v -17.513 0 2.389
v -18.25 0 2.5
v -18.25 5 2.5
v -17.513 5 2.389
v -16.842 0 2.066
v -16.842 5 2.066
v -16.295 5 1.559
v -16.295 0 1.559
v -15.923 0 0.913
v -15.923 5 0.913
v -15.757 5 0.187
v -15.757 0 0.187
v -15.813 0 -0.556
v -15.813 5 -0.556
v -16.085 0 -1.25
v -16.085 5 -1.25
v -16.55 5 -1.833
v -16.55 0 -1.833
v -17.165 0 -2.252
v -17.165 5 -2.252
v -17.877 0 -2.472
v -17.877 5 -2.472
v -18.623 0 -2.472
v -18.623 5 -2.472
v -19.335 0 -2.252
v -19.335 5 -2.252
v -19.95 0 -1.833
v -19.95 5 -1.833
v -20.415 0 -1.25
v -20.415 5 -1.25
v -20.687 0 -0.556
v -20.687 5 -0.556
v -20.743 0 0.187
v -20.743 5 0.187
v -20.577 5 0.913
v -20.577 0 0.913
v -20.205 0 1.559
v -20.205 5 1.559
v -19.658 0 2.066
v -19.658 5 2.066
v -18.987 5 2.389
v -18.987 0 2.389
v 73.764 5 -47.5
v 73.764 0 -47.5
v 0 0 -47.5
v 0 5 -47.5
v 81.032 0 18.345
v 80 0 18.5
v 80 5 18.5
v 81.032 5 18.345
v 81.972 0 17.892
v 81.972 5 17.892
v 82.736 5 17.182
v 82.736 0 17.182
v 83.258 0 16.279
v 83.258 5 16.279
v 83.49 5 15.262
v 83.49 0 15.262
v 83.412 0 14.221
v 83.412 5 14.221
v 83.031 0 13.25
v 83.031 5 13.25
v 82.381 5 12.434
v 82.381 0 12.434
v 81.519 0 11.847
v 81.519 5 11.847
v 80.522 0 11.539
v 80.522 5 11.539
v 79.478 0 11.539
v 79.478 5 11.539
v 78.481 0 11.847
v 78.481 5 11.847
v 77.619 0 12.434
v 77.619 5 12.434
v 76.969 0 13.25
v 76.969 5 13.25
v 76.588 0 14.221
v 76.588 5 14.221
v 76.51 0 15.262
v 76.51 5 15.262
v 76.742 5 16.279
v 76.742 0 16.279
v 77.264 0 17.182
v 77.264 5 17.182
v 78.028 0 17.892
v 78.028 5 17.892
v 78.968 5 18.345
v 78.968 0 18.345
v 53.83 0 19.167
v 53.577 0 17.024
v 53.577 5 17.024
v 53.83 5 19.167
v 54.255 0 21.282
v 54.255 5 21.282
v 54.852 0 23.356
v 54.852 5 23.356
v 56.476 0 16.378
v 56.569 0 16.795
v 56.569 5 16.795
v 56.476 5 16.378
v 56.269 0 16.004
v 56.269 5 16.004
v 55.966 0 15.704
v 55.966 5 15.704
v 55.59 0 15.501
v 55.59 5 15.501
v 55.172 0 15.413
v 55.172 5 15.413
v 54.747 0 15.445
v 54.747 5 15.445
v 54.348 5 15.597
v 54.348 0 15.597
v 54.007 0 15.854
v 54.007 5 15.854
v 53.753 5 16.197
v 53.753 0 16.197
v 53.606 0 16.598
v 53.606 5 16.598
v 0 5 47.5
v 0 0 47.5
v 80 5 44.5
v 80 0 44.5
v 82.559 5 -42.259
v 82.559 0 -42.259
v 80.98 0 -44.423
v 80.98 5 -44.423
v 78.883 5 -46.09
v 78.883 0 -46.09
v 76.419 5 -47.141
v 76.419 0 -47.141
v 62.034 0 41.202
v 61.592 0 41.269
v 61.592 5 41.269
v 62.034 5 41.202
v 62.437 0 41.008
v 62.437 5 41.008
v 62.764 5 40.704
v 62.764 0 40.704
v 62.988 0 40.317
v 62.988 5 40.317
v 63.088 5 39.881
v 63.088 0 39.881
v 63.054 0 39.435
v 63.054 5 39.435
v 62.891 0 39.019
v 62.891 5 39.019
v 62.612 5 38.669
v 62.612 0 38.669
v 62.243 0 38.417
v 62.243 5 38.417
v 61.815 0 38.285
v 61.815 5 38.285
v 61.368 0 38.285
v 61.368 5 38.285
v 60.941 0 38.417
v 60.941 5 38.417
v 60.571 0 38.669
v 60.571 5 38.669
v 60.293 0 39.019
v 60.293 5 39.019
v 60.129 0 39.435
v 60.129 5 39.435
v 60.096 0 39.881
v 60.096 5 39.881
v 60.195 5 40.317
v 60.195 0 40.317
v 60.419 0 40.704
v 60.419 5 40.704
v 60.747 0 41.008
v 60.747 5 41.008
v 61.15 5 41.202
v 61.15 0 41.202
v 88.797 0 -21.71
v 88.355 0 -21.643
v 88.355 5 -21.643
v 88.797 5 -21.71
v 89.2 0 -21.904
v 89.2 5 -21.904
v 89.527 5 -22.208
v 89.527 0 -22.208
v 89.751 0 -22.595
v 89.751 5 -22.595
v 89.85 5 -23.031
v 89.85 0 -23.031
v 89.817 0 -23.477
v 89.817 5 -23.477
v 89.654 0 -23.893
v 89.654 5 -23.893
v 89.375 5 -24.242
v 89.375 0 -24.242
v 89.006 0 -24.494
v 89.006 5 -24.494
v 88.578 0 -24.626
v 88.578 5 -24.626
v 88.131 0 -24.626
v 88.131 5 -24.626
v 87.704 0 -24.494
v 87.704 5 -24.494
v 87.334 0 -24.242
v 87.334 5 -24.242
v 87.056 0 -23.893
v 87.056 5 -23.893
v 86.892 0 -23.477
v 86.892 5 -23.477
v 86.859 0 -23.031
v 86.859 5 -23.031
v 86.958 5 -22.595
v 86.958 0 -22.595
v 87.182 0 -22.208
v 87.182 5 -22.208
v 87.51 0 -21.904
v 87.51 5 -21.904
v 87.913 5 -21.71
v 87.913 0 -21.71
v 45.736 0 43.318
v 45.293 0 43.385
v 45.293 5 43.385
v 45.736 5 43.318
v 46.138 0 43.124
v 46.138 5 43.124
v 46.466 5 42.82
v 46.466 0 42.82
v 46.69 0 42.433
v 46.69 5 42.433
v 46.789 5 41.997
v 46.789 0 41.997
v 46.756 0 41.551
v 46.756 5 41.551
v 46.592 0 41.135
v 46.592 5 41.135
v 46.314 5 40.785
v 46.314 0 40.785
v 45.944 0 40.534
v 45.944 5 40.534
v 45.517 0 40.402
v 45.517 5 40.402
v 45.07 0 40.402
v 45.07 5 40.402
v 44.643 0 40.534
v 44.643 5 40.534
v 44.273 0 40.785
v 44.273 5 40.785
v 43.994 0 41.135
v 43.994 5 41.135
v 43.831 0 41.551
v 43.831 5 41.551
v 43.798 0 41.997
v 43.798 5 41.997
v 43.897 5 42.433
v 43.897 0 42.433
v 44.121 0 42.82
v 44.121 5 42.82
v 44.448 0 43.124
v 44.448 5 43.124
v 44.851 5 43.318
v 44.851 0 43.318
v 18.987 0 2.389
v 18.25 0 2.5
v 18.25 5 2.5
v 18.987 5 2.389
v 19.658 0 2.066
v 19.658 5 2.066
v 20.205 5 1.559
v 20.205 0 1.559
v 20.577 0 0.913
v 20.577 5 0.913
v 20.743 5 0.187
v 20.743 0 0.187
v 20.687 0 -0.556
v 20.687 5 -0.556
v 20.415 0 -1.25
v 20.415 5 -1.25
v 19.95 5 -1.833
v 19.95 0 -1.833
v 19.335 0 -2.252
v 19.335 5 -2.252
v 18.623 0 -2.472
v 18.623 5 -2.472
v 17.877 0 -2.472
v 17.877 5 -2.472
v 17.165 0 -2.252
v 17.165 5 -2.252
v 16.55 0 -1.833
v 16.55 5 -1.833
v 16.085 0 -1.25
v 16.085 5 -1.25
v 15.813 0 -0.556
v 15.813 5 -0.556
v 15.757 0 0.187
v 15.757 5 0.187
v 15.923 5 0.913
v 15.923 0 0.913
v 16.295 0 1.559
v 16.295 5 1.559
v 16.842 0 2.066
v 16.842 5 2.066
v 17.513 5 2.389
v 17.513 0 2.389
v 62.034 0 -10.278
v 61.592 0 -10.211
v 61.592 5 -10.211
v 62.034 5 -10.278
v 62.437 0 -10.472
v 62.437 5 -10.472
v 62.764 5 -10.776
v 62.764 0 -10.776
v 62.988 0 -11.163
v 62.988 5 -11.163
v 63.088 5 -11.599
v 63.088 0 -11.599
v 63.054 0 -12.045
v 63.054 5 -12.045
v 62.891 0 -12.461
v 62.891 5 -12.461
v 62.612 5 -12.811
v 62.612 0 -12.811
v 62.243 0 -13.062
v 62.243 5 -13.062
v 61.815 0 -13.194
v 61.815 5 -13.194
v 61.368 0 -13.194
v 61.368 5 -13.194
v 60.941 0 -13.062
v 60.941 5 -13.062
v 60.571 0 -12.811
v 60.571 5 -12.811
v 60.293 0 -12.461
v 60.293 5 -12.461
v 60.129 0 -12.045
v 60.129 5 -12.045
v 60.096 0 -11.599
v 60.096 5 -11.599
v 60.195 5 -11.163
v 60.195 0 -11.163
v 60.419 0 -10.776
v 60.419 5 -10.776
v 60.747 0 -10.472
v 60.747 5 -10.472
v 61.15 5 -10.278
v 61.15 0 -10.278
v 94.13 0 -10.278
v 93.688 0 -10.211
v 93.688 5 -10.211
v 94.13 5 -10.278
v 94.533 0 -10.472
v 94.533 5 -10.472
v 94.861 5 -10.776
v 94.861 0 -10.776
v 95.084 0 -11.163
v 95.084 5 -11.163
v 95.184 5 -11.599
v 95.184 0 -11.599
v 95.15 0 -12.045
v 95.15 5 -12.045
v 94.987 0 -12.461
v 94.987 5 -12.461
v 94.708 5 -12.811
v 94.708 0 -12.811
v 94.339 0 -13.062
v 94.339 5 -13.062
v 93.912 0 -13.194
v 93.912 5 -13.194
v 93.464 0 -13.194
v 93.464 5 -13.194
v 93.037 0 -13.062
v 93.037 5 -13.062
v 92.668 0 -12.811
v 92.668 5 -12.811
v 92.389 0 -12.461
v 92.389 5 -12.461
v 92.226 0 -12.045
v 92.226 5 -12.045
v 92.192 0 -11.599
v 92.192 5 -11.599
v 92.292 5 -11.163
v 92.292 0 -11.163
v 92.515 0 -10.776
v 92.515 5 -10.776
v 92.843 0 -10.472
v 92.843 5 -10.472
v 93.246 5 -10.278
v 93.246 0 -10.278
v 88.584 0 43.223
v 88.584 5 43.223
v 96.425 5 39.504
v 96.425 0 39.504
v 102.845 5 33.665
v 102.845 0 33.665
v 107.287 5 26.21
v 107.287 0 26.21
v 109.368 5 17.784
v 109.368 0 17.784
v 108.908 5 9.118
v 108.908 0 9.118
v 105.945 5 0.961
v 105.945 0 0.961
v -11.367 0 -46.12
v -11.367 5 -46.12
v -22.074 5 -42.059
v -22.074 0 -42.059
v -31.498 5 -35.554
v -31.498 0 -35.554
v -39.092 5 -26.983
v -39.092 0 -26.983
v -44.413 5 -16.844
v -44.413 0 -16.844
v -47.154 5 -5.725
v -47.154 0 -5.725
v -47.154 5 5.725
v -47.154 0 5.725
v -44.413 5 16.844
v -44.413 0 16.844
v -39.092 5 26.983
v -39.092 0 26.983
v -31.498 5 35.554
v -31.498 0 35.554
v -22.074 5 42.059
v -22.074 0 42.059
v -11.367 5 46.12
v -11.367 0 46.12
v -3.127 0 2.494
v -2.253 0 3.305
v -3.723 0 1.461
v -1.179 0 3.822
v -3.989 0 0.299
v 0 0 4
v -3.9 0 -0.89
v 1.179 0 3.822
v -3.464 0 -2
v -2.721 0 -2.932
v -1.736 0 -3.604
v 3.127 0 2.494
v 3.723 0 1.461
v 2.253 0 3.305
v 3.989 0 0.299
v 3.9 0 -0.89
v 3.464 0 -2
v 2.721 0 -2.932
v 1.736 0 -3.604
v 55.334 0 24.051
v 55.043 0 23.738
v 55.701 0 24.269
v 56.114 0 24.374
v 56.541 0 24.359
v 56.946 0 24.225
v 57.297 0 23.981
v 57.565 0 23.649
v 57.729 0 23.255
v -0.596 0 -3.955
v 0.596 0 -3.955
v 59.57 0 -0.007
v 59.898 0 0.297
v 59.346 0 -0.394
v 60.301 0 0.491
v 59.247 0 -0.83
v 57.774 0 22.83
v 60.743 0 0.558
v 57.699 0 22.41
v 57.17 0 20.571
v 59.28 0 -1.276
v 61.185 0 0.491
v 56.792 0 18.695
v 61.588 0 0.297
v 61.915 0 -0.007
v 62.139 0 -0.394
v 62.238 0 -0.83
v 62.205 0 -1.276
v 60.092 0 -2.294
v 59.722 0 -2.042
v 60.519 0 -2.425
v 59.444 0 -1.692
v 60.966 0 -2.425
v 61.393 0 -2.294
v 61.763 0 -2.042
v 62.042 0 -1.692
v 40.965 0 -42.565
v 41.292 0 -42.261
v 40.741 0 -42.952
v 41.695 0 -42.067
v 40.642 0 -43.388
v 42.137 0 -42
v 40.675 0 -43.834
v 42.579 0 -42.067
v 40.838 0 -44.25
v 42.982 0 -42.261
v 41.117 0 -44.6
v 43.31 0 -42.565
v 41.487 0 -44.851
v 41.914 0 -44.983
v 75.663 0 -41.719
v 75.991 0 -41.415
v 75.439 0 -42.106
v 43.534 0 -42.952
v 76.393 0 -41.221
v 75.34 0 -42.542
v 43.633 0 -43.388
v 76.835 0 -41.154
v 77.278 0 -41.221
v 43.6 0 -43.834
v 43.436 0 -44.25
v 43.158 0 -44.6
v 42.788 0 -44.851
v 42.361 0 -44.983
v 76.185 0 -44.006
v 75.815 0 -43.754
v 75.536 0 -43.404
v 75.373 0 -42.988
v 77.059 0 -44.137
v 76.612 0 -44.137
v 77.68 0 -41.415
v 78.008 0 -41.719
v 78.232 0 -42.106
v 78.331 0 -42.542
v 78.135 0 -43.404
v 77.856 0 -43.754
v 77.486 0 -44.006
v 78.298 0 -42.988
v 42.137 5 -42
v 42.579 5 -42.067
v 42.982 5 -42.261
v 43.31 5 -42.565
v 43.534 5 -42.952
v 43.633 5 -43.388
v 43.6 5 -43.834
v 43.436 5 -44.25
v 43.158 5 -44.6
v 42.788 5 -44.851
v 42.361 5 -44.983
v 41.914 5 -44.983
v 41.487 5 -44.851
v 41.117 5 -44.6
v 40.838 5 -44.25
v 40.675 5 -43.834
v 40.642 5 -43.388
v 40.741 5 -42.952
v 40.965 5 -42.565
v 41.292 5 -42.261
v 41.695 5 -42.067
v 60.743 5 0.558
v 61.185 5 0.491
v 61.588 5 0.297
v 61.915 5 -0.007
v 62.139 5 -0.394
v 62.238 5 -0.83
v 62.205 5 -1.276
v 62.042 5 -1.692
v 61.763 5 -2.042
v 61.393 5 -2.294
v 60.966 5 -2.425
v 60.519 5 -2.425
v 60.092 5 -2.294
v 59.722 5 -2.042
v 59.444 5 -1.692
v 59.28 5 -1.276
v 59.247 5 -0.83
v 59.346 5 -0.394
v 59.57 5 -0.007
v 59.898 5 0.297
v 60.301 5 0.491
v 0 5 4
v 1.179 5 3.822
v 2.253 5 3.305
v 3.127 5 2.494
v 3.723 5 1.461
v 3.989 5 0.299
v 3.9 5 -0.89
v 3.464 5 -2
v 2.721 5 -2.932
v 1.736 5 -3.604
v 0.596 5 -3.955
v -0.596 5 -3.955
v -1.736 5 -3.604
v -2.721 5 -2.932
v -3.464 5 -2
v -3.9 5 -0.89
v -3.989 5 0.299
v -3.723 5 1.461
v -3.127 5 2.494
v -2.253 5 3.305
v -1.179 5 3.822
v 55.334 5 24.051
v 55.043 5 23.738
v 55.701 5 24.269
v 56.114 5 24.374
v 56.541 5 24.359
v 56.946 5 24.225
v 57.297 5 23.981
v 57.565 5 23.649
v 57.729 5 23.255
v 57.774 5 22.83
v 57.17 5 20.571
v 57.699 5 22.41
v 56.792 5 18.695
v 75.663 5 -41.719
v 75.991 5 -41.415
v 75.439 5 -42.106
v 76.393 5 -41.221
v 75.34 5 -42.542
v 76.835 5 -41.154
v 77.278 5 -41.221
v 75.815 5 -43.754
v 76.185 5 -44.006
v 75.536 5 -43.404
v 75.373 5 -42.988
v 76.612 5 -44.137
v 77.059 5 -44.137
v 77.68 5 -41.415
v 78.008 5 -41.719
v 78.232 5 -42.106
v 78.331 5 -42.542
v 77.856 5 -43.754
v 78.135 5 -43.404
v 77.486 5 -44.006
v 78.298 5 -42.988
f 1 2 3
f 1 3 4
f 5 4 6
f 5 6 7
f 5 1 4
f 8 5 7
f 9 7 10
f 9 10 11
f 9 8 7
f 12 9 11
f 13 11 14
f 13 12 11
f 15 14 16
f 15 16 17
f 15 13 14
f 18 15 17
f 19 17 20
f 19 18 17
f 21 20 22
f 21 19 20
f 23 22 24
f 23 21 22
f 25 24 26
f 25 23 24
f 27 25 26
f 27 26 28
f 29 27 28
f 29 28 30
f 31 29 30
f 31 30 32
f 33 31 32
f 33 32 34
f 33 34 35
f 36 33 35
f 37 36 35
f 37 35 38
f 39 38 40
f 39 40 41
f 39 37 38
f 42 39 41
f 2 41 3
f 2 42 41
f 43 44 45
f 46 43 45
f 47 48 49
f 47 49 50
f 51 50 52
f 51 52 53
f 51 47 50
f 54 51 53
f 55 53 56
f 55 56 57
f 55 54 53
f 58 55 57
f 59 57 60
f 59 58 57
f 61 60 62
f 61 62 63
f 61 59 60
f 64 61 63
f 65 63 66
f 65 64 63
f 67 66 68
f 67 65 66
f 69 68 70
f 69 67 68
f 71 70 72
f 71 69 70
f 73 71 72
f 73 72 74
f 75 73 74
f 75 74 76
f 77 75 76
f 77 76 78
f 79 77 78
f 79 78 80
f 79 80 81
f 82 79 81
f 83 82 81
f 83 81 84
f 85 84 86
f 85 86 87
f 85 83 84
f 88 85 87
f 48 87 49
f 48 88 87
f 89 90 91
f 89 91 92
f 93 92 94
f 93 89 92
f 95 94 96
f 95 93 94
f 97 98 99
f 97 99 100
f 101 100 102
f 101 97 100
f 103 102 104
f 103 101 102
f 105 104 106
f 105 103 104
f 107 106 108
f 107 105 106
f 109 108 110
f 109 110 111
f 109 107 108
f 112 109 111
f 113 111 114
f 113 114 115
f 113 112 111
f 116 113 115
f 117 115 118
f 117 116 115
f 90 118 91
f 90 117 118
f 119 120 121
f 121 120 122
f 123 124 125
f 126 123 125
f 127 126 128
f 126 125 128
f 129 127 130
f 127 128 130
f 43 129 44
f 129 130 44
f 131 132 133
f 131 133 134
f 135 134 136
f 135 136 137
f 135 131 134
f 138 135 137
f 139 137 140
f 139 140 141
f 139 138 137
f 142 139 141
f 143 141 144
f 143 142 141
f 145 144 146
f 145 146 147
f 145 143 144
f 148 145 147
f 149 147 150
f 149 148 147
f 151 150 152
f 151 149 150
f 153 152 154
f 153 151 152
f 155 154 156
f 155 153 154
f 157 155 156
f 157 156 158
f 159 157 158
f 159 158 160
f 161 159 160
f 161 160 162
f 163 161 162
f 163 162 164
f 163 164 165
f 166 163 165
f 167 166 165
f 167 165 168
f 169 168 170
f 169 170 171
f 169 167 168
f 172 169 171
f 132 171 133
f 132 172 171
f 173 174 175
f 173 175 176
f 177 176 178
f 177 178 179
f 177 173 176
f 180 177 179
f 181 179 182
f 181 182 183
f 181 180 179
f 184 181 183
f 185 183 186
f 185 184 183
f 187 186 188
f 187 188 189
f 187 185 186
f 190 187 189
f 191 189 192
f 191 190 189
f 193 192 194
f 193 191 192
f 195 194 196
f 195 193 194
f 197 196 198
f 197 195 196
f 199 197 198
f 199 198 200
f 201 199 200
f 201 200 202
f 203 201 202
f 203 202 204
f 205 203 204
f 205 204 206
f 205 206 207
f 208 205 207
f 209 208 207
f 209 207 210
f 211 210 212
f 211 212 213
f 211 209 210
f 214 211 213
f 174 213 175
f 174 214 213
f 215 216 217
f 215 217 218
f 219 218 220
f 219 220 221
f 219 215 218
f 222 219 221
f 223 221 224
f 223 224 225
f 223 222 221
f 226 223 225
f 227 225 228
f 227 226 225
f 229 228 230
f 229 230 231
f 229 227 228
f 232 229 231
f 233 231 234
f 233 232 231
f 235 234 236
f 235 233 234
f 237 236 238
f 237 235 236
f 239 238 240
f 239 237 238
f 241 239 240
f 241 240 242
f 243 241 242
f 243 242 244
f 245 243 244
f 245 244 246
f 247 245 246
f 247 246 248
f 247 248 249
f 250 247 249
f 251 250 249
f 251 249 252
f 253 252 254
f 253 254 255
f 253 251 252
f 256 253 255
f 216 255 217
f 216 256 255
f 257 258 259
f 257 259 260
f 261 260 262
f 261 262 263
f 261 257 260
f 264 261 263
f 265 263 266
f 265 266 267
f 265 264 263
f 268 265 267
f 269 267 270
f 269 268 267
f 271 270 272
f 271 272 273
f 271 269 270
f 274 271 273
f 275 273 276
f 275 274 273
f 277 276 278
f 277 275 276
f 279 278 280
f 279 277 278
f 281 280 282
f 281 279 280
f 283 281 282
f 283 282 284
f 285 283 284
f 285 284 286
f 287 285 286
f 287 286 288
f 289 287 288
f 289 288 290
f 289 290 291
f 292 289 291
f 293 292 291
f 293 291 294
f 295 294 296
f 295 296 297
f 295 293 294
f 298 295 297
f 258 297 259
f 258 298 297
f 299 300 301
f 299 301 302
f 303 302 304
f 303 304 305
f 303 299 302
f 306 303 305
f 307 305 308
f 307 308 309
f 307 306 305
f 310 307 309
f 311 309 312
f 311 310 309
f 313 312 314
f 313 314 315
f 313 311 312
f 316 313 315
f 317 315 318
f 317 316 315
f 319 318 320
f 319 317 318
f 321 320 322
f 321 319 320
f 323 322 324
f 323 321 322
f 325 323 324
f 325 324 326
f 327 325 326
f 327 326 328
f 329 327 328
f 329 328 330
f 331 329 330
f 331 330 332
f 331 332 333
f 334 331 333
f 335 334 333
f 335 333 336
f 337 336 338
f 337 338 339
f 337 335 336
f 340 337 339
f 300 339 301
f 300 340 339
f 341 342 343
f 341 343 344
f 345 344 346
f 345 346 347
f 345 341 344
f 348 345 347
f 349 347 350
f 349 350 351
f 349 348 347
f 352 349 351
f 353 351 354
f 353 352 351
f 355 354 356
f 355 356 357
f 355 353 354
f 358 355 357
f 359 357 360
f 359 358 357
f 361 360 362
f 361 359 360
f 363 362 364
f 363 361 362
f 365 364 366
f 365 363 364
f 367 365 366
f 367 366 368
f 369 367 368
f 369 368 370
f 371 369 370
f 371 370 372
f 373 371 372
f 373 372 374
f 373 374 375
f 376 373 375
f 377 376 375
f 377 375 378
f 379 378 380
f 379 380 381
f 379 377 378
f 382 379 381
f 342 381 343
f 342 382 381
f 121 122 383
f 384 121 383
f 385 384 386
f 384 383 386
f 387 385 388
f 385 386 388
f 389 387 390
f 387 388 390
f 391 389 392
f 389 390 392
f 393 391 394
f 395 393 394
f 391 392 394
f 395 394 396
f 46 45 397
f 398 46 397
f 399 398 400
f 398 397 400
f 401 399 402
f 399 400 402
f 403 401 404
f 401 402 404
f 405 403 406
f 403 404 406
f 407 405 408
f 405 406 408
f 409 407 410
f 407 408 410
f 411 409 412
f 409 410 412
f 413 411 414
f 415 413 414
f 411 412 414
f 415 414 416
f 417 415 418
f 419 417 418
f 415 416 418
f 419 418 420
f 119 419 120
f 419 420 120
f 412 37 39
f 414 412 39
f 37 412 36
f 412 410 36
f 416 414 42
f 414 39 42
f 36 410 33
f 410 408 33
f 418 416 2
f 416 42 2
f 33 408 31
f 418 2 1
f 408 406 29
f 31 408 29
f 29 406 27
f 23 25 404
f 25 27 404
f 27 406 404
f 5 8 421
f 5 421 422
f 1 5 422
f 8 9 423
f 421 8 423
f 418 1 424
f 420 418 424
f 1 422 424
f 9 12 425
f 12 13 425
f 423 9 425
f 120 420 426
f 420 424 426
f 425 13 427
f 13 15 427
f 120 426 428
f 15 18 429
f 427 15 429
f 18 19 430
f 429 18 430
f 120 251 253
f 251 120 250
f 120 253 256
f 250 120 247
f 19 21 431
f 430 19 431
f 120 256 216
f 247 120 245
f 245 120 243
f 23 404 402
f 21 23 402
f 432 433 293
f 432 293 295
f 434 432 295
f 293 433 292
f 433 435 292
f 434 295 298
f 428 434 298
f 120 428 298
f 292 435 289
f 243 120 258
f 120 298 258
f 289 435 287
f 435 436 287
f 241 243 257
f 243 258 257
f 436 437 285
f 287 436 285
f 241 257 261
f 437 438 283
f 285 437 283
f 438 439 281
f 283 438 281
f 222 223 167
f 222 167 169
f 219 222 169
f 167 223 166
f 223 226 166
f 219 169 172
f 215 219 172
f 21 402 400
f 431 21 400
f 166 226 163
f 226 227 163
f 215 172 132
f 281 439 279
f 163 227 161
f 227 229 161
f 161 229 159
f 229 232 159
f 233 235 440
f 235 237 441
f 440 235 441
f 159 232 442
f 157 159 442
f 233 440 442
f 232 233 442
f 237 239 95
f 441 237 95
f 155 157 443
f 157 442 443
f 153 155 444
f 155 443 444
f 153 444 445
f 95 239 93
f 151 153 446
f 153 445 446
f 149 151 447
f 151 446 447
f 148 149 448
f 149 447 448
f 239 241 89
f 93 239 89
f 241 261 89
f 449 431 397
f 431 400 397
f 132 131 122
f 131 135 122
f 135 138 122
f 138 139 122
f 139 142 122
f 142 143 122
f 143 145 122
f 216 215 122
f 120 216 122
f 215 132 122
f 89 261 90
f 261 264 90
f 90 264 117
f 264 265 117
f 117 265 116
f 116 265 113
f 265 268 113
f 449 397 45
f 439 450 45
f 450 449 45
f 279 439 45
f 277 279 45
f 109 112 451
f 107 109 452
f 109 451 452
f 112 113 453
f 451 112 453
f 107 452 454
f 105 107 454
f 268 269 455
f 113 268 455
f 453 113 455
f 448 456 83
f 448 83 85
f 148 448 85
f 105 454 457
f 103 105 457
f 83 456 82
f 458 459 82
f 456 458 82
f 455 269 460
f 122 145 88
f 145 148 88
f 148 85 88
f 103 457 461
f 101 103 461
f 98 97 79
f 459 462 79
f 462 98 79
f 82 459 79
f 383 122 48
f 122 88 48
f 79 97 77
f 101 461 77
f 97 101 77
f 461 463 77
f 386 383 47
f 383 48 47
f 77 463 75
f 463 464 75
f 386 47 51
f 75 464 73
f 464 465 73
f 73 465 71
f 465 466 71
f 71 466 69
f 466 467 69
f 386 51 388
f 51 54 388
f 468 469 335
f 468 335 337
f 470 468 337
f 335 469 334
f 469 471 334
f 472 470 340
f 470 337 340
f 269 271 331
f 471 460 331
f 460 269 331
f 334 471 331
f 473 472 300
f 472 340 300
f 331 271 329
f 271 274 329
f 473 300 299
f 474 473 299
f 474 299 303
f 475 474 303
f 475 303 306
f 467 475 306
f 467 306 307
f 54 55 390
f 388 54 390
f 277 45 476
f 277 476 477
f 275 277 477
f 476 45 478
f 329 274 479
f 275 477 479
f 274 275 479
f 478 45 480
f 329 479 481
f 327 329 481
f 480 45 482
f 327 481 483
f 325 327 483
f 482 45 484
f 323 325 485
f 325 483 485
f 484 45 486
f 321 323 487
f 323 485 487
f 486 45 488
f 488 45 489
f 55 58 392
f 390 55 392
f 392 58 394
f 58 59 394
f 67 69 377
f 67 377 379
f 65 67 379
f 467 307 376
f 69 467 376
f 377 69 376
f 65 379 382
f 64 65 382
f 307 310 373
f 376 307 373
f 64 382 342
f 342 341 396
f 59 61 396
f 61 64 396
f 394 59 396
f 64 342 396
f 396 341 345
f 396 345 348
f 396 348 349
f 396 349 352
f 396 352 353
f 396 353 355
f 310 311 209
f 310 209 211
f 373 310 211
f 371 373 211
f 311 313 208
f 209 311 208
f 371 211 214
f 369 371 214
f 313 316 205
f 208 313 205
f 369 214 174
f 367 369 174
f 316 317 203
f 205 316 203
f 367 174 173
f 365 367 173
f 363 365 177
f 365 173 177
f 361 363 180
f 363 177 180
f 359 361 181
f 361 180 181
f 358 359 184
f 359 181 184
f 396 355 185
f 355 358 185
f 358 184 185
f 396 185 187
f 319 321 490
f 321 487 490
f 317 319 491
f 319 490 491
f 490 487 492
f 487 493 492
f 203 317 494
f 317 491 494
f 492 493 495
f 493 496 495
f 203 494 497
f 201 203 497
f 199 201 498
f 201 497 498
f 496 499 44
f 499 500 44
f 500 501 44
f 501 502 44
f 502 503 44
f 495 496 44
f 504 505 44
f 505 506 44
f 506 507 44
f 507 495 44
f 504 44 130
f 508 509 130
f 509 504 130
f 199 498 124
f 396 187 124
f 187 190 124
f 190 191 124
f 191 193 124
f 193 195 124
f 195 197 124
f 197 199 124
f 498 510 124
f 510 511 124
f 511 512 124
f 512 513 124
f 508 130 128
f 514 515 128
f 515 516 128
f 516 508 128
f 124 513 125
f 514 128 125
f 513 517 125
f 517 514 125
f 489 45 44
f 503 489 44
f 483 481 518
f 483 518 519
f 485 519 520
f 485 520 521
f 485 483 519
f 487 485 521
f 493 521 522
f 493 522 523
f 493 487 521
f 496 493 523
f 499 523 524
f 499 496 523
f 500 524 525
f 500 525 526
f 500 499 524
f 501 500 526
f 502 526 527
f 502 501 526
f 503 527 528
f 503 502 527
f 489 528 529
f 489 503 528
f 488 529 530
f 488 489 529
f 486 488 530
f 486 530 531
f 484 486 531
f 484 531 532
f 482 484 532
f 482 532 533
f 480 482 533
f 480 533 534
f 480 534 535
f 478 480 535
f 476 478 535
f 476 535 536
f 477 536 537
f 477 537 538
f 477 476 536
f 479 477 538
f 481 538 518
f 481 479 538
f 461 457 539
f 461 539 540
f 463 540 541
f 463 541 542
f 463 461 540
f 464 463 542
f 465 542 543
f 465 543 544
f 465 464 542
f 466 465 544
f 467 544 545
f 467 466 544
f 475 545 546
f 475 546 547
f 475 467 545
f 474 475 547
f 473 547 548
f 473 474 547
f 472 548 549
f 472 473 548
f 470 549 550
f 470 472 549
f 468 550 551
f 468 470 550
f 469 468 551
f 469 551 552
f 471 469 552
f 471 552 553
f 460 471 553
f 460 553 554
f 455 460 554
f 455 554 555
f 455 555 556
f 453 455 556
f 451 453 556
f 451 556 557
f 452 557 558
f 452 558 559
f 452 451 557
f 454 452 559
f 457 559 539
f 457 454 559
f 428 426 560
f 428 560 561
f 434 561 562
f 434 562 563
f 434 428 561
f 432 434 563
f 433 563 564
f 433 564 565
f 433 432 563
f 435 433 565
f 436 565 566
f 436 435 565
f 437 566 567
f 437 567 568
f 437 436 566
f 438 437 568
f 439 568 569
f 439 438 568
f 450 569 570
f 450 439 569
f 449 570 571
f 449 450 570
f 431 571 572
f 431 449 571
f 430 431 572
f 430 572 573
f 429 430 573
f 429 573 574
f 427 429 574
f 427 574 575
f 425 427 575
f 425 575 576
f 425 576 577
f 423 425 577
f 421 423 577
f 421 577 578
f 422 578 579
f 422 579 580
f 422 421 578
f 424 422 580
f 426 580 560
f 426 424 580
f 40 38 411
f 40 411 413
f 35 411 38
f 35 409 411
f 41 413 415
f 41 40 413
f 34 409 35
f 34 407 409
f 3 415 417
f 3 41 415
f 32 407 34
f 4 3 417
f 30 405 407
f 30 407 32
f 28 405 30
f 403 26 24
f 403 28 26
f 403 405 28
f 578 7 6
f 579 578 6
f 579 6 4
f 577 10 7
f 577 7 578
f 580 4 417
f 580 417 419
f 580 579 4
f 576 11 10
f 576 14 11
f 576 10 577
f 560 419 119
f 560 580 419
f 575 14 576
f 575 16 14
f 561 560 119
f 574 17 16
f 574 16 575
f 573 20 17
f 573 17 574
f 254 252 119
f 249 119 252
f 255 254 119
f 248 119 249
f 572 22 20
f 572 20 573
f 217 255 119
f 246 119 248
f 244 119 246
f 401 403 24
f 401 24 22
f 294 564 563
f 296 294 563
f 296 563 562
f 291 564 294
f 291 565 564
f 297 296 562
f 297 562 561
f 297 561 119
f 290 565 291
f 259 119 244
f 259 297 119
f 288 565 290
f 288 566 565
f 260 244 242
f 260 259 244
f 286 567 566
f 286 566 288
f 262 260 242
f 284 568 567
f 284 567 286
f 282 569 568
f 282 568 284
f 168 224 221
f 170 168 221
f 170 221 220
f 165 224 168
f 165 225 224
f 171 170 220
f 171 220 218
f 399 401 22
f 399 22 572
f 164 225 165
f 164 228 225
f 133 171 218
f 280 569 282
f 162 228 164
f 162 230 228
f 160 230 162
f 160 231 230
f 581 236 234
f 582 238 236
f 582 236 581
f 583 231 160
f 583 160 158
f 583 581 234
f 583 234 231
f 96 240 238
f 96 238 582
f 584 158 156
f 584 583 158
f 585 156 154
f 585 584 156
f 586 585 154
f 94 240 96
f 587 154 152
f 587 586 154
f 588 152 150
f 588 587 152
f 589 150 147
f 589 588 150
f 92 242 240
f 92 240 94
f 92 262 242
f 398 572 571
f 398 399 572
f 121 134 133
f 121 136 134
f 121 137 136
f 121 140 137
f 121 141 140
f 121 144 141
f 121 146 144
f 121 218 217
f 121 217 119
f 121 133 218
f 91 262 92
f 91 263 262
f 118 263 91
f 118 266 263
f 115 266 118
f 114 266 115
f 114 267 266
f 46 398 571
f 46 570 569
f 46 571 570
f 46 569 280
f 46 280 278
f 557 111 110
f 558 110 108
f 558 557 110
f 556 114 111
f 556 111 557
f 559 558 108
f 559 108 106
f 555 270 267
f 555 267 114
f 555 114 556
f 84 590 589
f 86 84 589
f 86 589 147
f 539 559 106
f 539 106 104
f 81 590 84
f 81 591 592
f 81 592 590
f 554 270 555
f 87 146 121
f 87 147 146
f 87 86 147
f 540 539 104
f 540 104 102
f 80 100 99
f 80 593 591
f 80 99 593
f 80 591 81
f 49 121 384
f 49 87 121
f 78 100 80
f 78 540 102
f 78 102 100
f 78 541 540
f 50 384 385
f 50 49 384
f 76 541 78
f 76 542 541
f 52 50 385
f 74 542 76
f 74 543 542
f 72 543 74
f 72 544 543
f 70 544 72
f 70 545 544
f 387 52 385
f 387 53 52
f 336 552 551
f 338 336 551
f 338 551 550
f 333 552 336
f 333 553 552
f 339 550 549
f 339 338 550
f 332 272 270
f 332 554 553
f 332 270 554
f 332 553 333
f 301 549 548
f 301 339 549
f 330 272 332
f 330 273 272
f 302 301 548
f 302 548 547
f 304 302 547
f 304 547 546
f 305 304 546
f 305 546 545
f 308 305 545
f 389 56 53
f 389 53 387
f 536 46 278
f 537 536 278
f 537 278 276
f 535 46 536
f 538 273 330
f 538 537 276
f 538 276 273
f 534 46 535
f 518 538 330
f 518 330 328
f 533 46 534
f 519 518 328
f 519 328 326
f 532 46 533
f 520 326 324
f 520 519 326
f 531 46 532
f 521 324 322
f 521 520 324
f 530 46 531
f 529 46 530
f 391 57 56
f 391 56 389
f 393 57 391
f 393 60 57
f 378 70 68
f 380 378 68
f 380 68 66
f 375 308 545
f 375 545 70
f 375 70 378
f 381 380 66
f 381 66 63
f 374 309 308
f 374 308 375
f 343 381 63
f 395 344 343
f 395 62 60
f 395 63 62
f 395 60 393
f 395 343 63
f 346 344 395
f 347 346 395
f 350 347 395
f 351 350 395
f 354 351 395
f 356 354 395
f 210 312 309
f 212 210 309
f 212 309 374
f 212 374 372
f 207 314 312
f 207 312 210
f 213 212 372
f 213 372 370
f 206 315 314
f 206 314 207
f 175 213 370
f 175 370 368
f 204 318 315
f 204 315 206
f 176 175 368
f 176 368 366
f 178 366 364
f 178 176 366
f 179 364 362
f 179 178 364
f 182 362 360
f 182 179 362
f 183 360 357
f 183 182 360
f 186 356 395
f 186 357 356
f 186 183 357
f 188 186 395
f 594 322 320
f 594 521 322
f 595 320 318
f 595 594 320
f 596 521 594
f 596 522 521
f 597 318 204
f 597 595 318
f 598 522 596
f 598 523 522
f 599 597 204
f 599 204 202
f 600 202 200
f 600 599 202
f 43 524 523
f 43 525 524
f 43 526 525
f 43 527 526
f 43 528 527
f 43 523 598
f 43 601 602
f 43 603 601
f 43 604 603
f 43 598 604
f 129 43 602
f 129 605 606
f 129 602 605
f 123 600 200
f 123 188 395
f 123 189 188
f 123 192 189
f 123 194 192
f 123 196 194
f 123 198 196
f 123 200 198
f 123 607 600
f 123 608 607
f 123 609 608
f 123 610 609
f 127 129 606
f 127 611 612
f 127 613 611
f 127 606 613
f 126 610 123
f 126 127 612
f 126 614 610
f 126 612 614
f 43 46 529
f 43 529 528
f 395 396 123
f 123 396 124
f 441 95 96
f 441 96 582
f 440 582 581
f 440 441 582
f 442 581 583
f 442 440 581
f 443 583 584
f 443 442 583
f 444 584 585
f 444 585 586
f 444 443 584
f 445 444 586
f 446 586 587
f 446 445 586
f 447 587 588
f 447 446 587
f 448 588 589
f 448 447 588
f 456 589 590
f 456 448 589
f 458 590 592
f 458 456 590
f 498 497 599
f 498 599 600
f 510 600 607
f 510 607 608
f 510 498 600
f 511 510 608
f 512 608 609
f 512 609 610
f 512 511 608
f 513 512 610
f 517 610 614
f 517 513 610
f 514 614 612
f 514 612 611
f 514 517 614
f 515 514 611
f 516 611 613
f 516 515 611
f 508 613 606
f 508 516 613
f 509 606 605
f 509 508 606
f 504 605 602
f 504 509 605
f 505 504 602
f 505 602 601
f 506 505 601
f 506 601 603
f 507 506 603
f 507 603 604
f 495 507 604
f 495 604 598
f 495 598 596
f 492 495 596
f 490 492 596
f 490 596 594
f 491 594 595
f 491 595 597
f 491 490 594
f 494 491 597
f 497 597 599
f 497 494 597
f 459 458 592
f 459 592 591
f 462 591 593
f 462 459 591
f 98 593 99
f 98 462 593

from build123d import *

# Parameters (mm, degrees)
SKETCH1_R           = 4
SKETCH1_R_2         = 1.5
SKETCH1_R_3         = 2.5
SKETCH1_R_4         = 3.5
BOSS_EXTRUDE1_DEPTH = 5


with BuildPart() as part:
    # Sketch1 → Boss-Extrude1 (new body)
    with BuildSketch(Plane(origin=(0, 0, 0), x_dir=(1, 0, 0), z_dir=(0, 1, 0))):
        with BuildLine():
            Line((0, -47.5), (80, -44.5))
            ThreePointArc((80, -44.5), (105.341650726, -30.101348895), (105.945295539, -0.961067014))
            Line((105.945295539, -0.961067014), (82.559049402, 42.258960334))
            ThreePointArc((82.559049402, 42.258960334), (78.883135286, 46.090390077), (73.764033965, 47.5))
            Line((73.764033965, 47.5), (0, 47.5))
            ThreePointArc((0, 47.5), (-47.5, 0), (0, -47.5))
        make_face()
        with Locations(Location((0, 0, 0), (0, 0, 270))):
            Circle(SKETCH1_R, mode=Mode.SUBTRACT)
        with Locations(Location((60.74263676, 0.942206906, 0), (0, 0, 270))):
            Circle(SKETCH1_R_2, mode=Mode.SUBTRACT)
        with Locations(Location((18.25, 0, 0), (0, 0, 270))):
            Circle(SKETCH1_R_3, mode=Mode.SUBTRACT)
        with Locations(Location((-18.25, 0, 0), (0, 0, 270))):
            Circle(SKETCH1_R_3, mode=Mode.SUBTRACT)
        with Locations(Location((80, -15, 0), (0, 0, 270))):
            Circle(SKETCH1_R_4, mode=Mode.SUBTRACT)
        with Locations(Location((76.835494757, 42.654234046, 0), (0, 0, 270))):
            Circle(SKETCH1_R_2, mode=Mode.SUBTRACT)
        with Locations(Location((88.354686129, 23.142870245, 0), (0, 0, 270))):
            Circle(SKETCH1_R_2, mode=Mode.SUBTRACT)
        with Locations(Location((42.137334928, 43.5, 0), (0, 0, 270))):
            Circle(SKETCH1_R_2, mode=Mode.SUBTRACT)
        with Locations(Location((45.293422434, -41.885064382, 0), (0, 0, 270))):
            Circle(SKETCH1_R_2, mode=Mode.SUBTRACT)
        with Locations(Location((61.591696316, 11.71100727, 0), (0, 0, 270))):
            Circle(SKETCH1_R_2, mode=Mode.SUBTRACT)
        with Locations(Location((93.688017257, 11.71100727, 0), (0, 0, 270))):
            Circle(SKETCH1_R_2, mode=Mode.SUBTRACT)
        with Locations(Location((61.591696316, -39.768646015, 0), (0, 0, 270))):
            Circle(SKETCH1_R_2, mode=Mode.SUBTRACT)
        with BuildLine():
            ThreePointArc((53.577406183, -17.023990113), (54.021018537, -20.229007757), (54.851917667, -23.356072939))
            ThreePointArc((54.851917667, -23.356072939), (56.748379286, -24.306564037), (57.698870384, -22.410102418))
            ThreePointArc((57.698870384, -22.410102418), (56.962035306, -19.637044615), (56.568643219, -16.794859157))
            ThreePointArc((56.568643219, -16.794859157), (54.958459223, -15.413806117), (53.577406183, -17.023990113))
        make_face(mode=Mode.SUBTRACT)
    extrude(amount=BOSS_EXTRUDE1_DEPTH)


solid = part.part
